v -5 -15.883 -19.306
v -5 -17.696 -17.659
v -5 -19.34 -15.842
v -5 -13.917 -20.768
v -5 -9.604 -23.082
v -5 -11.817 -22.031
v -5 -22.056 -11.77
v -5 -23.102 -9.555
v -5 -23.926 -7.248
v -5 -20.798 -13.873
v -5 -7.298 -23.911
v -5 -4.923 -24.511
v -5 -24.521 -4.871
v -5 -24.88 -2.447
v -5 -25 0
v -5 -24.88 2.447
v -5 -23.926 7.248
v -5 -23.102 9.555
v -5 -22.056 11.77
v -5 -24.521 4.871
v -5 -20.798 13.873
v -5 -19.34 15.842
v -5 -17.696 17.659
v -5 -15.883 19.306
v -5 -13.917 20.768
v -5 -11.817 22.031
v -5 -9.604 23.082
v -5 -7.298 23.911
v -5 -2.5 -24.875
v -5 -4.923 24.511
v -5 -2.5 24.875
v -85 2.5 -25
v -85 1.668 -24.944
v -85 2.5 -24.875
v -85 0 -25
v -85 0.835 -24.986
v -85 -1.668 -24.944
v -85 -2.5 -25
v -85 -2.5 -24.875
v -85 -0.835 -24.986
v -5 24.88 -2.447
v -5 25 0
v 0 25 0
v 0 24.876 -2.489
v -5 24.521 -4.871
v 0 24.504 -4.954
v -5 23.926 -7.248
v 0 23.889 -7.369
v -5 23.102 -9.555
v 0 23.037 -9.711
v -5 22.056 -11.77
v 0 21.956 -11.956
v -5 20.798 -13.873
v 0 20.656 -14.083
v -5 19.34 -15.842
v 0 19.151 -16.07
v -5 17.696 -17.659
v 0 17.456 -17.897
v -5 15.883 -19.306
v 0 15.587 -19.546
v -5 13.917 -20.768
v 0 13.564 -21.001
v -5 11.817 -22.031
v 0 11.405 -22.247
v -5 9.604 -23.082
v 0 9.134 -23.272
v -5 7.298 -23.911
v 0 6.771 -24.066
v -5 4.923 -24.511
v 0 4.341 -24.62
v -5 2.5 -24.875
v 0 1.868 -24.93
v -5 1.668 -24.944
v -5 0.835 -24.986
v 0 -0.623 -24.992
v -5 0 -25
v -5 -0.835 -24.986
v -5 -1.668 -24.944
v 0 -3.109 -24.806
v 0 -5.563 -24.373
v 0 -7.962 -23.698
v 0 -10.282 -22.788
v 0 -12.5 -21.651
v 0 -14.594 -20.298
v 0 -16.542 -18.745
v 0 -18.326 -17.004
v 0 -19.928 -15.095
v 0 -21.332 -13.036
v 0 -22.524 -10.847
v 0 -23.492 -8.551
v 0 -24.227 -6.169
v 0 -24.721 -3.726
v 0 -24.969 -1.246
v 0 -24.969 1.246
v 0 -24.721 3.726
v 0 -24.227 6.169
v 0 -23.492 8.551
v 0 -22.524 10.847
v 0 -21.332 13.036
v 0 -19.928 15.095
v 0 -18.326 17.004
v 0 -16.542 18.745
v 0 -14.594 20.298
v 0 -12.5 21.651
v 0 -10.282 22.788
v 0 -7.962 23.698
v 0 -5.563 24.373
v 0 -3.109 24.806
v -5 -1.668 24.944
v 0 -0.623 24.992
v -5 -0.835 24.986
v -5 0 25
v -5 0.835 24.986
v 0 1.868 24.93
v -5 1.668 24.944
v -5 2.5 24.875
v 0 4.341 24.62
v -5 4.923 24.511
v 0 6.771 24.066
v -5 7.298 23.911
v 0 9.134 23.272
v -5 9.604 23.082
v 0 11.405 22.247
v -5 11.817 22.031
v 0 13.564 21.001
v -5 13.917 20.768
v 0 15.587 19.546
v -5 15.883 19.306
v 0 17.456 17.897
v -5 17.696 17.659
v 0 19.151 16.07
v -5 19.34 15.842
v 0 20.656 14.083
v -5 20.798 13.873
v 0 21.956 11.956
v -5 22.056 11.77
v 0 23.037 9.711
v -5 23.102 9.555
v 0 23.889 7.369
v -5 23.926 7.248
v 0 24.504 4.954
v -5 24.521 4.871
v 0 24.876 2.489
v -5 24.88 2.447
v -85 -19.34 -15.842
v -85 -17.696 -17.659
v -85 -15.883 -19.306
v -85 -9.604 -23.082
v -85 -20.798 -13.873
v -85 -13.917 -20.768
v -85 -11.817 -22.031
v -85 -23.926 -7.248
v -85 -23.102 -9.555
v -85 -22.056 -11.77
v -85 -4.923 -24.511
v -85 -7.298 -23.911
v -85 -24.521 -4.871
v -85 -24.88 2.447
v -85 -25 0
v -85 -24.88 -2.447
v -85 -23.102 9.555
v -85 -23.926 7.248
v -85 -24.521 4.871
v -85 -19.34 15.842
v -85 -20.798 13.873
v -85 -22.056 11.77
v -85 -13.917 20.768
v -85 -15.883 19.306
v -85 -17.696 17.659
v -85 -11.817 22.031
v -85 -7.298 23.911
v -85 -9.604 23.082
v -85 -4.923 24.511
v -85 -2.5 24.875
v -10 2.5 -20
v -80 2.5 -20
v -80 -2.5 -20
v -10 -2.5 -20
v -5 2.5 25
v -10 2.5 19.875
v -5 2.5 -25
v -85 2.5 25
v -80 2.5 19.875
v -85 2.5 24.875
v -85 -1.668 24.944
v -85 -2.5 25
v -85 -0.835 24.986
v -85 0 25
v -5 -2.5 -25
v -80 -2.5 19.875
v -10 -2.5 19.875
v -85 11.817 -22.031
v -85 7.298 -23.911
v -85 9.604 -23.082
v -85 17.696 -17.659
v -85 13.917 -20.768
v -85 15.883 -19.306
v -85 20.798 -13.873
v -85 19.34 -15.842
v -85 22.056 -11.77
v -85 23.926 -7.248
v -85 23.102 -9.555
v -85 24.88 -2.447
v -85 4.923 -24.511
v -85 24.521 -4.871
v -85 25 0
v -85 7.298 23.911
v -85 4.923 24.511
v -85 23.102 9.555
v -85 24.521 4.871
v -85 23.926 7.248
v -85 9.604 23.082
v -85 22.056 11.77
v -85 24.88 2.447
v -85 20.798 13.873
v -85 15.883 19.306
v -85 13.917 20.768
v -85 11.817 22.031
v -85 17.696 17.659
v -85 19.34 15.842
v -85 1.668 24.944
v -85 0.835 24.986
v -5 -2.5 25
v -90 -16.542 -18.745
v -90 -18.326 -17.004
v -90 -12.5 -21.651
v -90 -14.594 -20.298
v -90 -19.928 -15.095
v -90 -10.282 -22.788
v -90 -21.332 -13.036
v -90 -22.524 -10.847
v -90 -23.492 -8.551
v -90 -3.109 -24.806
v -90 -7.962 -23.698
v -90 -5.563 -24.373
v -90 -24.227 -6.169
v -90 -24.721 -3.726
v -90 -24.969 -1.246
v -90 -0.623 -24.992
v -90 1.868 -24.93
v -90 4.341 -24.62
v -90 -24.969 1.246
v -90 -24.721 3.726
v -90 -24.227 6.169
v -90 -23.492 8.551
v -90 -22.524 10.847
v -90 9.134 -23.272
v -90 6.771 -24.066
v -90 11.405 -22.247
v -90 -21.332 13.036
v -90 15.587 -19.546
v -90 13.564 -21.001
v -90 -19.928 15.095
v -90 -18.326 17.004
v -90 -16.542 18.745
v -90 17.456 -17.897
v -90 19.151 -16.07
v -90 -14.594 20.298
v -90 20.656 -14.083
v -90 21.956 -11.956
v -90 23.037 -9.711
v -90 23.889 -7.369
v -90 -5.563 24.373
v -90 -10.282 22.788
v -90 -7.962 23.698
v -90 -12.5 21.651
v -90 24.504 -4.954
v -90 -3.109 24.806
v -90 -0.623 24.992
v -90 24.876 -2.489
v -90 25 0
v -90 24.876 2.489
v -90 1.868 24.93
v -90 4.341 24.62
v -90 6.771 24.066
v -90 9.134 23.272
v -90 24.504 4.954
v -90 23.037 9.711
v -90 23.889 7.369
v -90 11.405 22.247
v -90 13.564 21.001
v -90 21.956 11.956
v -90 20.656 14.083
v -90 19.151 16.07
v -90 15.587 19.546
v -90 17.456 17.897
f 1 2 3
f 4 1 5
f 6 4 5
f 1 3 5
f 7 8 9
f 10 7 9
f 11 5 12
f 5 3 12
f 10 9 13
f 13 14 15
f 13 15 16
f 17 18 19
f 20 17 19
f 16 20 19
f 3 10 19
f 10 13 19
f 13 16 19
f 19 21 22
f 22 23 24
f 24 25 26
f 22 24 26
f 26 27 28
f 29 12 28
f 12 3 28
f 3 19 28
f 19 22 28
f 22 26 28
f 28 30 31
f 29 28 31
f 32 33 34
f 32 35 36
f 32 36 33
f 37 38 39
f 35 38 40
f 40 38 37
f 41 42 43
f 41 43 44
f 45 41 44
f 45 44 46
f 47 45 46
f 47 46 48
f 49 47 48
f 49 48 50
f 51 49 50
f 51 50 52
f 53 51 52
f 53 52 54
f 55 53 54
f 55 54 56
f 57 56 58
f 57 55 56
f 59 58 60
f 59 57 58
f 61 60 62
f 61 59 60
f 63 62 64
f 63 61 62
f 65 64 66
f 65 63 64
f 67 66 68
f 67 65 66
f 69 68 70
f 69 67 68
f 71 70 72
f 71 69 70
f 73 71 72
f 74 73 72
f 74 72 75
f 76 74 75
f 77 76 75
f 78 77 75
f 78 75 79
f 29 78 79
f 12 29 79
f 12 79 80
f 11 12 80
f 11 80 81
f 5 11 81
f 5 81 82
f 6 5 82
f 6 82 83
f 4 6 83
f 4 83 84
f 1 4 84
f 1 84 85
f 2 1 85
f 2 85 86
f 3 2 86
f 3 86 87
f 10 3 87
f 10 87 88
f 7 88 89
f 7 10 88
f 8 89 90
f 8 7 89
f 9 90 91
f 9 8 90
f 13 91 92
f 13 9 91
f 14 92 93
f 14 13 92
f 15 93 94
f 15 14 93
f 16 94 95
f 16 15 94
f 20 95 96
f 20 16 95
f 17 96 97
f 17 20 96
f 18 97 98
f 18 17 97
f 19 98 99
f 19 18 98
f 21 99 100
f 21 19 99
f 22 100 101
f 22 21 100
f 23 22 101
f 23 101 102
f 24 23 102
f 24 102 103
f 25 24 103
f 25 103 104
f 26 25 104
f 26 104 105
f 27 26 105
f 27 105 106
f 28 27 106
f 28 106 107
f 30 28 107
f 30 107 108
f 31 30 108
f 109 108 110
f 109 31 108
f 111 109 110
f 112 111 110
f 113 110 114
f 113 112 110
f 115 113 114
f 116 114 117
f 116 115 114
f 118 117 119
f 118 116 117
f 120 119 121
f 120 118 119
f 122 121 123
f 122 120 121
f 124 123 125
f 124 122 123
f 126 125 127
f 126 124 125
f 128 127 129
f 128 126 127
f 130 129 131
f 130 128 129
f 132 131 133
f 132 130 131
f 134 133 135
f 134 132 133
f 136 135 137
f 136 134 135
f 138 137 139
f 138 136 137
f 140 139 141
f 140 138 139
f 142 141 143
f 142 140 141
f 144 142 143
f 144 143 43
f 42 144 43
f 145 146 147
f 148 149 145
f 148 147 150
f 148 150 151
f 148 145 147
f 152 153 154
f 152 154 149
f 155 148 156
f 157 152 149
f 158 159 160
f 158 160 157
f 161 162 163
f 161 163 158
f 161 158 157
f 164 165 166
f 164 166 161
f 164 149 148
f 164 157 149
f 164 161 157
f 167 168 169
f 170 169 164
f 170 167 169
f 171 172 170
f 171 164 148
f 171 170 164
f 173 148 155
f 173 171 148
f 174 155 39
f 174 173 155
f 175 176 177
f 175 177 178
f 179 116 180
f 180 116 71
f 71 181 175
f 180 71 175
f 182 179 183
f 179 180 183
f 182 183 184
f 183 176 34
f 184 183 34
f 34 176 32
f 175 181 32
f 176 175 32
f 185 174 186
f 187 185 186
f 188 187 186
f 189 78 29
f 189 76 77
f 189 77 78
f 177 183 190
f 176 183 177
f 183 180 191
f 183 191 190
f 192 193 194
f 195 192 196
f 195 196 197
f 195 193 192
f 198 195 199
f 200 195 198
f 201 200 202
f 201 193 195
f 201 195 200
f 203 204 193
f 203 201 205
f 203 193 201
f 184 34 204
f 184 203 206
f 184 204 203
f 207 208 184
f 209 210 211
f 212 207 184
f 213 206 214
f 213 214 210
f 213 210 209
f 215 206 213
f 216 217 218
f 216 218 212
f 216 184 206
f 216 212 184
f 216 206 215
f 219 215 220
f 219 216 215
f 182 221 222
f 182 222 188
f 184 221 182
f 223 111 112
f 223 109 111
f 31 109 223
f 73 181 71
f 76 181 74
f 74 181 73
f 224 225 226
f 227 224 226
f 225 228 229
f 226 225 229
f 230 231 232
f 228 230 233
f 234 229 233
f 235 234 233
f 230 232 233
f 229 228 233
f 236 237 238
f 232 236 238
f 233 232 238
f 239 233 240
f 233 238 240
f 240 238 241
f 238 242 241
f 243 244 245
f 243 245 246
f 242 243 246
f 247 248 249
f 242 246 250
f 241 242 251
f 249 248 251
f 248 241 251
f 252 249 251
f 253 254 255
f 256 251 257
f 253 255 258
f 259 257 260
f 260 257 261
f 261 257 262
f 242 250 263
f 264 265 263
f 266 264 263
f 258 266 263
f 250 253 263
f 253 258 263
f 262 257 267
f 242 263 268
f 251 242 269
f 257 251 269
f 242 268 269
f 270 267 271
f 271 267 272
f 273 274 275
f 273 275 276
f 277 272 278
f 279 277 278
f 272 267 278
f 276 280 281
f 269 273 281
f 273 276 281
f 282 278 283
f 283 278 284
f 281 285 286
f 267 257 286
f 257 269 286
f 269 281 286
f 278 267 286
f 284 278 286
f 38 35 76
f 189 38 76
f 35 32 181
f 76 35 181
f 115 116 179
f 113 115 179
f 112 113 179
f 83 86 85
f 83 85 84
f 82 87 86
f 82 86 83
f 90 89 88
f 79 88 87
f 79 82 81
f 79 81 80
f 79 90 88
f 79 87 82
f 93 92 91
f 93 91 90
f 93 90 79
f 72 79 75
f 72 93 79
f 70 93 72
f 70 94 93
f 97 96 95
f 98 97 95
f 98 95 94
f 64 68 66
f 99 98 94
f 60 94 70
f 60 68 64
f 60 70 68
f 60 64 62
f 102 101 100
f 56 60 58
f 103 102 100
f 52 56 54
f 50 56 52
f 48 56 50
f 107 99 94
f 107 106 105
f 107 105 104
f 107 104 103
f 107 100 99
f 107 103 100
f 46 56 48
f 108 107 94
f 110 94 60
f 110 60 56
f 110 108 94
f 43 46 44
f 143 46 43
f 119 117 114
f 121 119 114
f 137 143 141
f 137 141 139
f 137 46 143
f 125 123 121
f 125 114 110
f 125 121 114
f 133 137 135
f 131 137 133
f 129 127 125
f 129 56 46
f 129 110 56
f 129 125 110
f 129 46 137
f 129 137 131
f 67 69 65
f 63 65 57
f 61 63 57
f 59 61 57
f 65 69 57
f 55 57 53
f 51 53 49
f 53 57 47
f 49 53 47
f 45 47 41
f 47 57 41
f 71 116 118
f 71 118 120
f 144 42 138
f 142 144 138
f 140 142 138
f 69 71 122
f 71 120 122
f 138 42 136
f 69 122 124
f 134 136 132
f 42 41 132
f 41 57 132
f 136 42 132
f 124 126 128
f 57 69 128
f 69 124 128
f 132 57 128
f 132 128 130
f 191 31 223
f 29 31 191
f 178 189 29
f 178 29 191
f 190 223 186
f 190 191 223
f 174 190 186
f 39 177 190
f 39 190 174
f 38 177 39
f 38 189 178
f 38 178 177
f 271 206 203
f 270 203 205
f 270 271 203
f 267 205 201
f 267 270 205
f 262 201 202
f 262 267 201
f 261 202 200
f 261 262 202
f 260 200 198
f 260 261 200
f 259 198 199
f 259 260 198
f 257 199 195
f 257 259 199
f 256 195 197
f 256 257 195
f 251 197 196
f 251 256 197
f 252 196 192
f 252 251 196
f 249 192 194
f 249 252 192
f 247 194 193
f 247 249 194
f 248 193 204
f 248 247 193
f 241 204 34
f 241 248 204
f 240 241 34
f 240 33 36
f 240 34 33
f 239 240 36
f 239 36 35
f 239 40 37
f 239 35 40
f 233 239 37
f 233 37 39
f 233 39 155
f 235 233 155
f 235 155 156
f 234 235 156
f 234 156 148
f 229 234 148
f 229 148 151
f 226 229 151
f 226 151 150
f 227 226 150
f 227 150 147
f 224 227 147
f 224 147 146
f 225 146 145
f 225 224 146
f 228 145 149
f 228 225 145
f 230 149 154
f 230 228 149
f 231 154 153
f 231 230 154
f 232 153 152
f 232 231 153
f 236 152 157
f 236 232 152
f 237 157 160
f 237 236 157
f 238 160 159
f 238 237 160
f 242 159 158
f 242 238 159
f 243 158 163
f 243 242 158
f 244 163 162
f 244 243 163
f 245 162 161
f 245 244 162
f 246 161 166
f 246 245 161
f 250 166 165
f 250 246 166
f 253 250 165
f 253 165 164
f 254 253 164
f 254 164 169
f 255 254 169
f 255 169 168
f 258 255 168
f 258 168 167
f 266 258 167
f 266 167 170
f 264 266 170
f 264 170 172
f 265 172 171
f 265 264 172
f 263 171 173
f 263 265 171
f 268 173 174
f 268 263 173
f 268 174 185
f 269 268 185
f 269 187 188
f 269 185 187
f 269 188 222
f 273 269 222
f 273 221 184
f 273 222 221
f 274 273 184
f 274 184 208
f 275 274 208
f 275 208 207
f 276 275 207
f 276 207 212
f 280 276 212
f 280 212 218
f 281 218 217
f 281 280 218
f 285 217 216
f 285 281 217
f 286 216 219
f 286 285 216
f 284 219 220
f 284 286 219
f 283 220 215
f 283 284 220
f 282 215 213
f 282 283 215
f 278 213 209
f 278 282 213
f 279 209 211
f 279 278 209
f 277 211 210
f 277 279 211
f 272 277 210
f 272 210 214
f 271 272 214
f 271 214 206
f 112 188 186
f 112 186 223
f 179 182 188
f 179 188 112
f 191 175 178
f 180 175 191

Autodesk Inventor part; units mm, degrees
ref_plane "YZ Plane" through (0, 0, 0) normal (1, 0, 0) x (0, 1, 0)
ref_plane "XZ Plane" through (0, 0, 0) normal (0, 1, 0) x (-1, 0, 0)
ref_plane "XY Plane" through (0, 0, 0) normal (0, 0, 1) x (1, 0, 0)
sketch "Sketch1" plane through (0, 0, 0) normal (0, 1, 0) x (-1, 0, 0)
  point P0 (0, 0)
sketch "Sketch2" plane through (0, 0, 0) normal (0, 0, 1) x (1, 0, 0)
  line L0 (0, 0) -> (0, 25)
  line L1 (0, 25) -> (-5, 25)
  line L2 (-5, 25) -> (-5, 2.5)
  line L3 (-5, 2.5) -> (-85, 2.5)
  line L4 (-85, 2.5) -> (-85, 25)
  line L5 (-85, 25) -> (-90, 25)
  line L6 (-90, 25) -> (-90, 0)
  line L7 (-90, 0) -> (0, 0)
  line L8 (-85, 2.5) -> (-5, 2.5)
  line L9 (-5, 2.5) -> (-5, -2.5)
  line L10 (-5, -2.5) -> (-85, -2.5)
  line L11 (-85, -2.5) -> (-85, 2.5)
  dimension "d0" = 25
  dimension "d1" = 5
  dimension "d2" = 22.5
  dimension "d3" = 80
  dimension "d4" = 5
  dimension "d6" = 5
revolve "Revolution1" add sketch "Sketch2" angle 360 about axis through (-90, 0, 0) along (1, 0, 0) contours L7 L9 L2 L1 L0 | L7 L11 L3 L9 | L7 L6 L5 L4 L11
extrude "Extrusion1" add sketch "Sketch2" along normal mid plane 50 contours L9 L10 L11 L7 | L7 L11 L3 L9
sketch "Sketch3" plane through (-85, 2.5, -25) normal (0, 1, 0) x (1, 0, 0)
  line L0 (80, 0) -> (0, 0) projected
  line L1 (80, -49.8747) -> (80, -0.1253) projected
  line L2 (0, 0) -> (80, 0)
  line L3 (80, 0) -> (80, -49.8747)
  line L4 (80, -49.8747) -> (0, -49.8747)
  line L5 (0, -49.8747) -> (0, 0)
  line L6 (5, -5) -> (75, -5)
  line L7 (75, -5) -> (75, -44.8747)
  line L8 (75, -44.8747) -> (5, -44.8747)
  line L9 (5, -44.8747) -> (5, -5)
  point P0 (85, -25)
  dimension "d9" = 5
extrude "Extrusion2" cut sketch "Sketch3" against normal mid plane 20 contours L6 L7 L8 L9
properties part number "electronicsbay" material "ABS Plastic"
